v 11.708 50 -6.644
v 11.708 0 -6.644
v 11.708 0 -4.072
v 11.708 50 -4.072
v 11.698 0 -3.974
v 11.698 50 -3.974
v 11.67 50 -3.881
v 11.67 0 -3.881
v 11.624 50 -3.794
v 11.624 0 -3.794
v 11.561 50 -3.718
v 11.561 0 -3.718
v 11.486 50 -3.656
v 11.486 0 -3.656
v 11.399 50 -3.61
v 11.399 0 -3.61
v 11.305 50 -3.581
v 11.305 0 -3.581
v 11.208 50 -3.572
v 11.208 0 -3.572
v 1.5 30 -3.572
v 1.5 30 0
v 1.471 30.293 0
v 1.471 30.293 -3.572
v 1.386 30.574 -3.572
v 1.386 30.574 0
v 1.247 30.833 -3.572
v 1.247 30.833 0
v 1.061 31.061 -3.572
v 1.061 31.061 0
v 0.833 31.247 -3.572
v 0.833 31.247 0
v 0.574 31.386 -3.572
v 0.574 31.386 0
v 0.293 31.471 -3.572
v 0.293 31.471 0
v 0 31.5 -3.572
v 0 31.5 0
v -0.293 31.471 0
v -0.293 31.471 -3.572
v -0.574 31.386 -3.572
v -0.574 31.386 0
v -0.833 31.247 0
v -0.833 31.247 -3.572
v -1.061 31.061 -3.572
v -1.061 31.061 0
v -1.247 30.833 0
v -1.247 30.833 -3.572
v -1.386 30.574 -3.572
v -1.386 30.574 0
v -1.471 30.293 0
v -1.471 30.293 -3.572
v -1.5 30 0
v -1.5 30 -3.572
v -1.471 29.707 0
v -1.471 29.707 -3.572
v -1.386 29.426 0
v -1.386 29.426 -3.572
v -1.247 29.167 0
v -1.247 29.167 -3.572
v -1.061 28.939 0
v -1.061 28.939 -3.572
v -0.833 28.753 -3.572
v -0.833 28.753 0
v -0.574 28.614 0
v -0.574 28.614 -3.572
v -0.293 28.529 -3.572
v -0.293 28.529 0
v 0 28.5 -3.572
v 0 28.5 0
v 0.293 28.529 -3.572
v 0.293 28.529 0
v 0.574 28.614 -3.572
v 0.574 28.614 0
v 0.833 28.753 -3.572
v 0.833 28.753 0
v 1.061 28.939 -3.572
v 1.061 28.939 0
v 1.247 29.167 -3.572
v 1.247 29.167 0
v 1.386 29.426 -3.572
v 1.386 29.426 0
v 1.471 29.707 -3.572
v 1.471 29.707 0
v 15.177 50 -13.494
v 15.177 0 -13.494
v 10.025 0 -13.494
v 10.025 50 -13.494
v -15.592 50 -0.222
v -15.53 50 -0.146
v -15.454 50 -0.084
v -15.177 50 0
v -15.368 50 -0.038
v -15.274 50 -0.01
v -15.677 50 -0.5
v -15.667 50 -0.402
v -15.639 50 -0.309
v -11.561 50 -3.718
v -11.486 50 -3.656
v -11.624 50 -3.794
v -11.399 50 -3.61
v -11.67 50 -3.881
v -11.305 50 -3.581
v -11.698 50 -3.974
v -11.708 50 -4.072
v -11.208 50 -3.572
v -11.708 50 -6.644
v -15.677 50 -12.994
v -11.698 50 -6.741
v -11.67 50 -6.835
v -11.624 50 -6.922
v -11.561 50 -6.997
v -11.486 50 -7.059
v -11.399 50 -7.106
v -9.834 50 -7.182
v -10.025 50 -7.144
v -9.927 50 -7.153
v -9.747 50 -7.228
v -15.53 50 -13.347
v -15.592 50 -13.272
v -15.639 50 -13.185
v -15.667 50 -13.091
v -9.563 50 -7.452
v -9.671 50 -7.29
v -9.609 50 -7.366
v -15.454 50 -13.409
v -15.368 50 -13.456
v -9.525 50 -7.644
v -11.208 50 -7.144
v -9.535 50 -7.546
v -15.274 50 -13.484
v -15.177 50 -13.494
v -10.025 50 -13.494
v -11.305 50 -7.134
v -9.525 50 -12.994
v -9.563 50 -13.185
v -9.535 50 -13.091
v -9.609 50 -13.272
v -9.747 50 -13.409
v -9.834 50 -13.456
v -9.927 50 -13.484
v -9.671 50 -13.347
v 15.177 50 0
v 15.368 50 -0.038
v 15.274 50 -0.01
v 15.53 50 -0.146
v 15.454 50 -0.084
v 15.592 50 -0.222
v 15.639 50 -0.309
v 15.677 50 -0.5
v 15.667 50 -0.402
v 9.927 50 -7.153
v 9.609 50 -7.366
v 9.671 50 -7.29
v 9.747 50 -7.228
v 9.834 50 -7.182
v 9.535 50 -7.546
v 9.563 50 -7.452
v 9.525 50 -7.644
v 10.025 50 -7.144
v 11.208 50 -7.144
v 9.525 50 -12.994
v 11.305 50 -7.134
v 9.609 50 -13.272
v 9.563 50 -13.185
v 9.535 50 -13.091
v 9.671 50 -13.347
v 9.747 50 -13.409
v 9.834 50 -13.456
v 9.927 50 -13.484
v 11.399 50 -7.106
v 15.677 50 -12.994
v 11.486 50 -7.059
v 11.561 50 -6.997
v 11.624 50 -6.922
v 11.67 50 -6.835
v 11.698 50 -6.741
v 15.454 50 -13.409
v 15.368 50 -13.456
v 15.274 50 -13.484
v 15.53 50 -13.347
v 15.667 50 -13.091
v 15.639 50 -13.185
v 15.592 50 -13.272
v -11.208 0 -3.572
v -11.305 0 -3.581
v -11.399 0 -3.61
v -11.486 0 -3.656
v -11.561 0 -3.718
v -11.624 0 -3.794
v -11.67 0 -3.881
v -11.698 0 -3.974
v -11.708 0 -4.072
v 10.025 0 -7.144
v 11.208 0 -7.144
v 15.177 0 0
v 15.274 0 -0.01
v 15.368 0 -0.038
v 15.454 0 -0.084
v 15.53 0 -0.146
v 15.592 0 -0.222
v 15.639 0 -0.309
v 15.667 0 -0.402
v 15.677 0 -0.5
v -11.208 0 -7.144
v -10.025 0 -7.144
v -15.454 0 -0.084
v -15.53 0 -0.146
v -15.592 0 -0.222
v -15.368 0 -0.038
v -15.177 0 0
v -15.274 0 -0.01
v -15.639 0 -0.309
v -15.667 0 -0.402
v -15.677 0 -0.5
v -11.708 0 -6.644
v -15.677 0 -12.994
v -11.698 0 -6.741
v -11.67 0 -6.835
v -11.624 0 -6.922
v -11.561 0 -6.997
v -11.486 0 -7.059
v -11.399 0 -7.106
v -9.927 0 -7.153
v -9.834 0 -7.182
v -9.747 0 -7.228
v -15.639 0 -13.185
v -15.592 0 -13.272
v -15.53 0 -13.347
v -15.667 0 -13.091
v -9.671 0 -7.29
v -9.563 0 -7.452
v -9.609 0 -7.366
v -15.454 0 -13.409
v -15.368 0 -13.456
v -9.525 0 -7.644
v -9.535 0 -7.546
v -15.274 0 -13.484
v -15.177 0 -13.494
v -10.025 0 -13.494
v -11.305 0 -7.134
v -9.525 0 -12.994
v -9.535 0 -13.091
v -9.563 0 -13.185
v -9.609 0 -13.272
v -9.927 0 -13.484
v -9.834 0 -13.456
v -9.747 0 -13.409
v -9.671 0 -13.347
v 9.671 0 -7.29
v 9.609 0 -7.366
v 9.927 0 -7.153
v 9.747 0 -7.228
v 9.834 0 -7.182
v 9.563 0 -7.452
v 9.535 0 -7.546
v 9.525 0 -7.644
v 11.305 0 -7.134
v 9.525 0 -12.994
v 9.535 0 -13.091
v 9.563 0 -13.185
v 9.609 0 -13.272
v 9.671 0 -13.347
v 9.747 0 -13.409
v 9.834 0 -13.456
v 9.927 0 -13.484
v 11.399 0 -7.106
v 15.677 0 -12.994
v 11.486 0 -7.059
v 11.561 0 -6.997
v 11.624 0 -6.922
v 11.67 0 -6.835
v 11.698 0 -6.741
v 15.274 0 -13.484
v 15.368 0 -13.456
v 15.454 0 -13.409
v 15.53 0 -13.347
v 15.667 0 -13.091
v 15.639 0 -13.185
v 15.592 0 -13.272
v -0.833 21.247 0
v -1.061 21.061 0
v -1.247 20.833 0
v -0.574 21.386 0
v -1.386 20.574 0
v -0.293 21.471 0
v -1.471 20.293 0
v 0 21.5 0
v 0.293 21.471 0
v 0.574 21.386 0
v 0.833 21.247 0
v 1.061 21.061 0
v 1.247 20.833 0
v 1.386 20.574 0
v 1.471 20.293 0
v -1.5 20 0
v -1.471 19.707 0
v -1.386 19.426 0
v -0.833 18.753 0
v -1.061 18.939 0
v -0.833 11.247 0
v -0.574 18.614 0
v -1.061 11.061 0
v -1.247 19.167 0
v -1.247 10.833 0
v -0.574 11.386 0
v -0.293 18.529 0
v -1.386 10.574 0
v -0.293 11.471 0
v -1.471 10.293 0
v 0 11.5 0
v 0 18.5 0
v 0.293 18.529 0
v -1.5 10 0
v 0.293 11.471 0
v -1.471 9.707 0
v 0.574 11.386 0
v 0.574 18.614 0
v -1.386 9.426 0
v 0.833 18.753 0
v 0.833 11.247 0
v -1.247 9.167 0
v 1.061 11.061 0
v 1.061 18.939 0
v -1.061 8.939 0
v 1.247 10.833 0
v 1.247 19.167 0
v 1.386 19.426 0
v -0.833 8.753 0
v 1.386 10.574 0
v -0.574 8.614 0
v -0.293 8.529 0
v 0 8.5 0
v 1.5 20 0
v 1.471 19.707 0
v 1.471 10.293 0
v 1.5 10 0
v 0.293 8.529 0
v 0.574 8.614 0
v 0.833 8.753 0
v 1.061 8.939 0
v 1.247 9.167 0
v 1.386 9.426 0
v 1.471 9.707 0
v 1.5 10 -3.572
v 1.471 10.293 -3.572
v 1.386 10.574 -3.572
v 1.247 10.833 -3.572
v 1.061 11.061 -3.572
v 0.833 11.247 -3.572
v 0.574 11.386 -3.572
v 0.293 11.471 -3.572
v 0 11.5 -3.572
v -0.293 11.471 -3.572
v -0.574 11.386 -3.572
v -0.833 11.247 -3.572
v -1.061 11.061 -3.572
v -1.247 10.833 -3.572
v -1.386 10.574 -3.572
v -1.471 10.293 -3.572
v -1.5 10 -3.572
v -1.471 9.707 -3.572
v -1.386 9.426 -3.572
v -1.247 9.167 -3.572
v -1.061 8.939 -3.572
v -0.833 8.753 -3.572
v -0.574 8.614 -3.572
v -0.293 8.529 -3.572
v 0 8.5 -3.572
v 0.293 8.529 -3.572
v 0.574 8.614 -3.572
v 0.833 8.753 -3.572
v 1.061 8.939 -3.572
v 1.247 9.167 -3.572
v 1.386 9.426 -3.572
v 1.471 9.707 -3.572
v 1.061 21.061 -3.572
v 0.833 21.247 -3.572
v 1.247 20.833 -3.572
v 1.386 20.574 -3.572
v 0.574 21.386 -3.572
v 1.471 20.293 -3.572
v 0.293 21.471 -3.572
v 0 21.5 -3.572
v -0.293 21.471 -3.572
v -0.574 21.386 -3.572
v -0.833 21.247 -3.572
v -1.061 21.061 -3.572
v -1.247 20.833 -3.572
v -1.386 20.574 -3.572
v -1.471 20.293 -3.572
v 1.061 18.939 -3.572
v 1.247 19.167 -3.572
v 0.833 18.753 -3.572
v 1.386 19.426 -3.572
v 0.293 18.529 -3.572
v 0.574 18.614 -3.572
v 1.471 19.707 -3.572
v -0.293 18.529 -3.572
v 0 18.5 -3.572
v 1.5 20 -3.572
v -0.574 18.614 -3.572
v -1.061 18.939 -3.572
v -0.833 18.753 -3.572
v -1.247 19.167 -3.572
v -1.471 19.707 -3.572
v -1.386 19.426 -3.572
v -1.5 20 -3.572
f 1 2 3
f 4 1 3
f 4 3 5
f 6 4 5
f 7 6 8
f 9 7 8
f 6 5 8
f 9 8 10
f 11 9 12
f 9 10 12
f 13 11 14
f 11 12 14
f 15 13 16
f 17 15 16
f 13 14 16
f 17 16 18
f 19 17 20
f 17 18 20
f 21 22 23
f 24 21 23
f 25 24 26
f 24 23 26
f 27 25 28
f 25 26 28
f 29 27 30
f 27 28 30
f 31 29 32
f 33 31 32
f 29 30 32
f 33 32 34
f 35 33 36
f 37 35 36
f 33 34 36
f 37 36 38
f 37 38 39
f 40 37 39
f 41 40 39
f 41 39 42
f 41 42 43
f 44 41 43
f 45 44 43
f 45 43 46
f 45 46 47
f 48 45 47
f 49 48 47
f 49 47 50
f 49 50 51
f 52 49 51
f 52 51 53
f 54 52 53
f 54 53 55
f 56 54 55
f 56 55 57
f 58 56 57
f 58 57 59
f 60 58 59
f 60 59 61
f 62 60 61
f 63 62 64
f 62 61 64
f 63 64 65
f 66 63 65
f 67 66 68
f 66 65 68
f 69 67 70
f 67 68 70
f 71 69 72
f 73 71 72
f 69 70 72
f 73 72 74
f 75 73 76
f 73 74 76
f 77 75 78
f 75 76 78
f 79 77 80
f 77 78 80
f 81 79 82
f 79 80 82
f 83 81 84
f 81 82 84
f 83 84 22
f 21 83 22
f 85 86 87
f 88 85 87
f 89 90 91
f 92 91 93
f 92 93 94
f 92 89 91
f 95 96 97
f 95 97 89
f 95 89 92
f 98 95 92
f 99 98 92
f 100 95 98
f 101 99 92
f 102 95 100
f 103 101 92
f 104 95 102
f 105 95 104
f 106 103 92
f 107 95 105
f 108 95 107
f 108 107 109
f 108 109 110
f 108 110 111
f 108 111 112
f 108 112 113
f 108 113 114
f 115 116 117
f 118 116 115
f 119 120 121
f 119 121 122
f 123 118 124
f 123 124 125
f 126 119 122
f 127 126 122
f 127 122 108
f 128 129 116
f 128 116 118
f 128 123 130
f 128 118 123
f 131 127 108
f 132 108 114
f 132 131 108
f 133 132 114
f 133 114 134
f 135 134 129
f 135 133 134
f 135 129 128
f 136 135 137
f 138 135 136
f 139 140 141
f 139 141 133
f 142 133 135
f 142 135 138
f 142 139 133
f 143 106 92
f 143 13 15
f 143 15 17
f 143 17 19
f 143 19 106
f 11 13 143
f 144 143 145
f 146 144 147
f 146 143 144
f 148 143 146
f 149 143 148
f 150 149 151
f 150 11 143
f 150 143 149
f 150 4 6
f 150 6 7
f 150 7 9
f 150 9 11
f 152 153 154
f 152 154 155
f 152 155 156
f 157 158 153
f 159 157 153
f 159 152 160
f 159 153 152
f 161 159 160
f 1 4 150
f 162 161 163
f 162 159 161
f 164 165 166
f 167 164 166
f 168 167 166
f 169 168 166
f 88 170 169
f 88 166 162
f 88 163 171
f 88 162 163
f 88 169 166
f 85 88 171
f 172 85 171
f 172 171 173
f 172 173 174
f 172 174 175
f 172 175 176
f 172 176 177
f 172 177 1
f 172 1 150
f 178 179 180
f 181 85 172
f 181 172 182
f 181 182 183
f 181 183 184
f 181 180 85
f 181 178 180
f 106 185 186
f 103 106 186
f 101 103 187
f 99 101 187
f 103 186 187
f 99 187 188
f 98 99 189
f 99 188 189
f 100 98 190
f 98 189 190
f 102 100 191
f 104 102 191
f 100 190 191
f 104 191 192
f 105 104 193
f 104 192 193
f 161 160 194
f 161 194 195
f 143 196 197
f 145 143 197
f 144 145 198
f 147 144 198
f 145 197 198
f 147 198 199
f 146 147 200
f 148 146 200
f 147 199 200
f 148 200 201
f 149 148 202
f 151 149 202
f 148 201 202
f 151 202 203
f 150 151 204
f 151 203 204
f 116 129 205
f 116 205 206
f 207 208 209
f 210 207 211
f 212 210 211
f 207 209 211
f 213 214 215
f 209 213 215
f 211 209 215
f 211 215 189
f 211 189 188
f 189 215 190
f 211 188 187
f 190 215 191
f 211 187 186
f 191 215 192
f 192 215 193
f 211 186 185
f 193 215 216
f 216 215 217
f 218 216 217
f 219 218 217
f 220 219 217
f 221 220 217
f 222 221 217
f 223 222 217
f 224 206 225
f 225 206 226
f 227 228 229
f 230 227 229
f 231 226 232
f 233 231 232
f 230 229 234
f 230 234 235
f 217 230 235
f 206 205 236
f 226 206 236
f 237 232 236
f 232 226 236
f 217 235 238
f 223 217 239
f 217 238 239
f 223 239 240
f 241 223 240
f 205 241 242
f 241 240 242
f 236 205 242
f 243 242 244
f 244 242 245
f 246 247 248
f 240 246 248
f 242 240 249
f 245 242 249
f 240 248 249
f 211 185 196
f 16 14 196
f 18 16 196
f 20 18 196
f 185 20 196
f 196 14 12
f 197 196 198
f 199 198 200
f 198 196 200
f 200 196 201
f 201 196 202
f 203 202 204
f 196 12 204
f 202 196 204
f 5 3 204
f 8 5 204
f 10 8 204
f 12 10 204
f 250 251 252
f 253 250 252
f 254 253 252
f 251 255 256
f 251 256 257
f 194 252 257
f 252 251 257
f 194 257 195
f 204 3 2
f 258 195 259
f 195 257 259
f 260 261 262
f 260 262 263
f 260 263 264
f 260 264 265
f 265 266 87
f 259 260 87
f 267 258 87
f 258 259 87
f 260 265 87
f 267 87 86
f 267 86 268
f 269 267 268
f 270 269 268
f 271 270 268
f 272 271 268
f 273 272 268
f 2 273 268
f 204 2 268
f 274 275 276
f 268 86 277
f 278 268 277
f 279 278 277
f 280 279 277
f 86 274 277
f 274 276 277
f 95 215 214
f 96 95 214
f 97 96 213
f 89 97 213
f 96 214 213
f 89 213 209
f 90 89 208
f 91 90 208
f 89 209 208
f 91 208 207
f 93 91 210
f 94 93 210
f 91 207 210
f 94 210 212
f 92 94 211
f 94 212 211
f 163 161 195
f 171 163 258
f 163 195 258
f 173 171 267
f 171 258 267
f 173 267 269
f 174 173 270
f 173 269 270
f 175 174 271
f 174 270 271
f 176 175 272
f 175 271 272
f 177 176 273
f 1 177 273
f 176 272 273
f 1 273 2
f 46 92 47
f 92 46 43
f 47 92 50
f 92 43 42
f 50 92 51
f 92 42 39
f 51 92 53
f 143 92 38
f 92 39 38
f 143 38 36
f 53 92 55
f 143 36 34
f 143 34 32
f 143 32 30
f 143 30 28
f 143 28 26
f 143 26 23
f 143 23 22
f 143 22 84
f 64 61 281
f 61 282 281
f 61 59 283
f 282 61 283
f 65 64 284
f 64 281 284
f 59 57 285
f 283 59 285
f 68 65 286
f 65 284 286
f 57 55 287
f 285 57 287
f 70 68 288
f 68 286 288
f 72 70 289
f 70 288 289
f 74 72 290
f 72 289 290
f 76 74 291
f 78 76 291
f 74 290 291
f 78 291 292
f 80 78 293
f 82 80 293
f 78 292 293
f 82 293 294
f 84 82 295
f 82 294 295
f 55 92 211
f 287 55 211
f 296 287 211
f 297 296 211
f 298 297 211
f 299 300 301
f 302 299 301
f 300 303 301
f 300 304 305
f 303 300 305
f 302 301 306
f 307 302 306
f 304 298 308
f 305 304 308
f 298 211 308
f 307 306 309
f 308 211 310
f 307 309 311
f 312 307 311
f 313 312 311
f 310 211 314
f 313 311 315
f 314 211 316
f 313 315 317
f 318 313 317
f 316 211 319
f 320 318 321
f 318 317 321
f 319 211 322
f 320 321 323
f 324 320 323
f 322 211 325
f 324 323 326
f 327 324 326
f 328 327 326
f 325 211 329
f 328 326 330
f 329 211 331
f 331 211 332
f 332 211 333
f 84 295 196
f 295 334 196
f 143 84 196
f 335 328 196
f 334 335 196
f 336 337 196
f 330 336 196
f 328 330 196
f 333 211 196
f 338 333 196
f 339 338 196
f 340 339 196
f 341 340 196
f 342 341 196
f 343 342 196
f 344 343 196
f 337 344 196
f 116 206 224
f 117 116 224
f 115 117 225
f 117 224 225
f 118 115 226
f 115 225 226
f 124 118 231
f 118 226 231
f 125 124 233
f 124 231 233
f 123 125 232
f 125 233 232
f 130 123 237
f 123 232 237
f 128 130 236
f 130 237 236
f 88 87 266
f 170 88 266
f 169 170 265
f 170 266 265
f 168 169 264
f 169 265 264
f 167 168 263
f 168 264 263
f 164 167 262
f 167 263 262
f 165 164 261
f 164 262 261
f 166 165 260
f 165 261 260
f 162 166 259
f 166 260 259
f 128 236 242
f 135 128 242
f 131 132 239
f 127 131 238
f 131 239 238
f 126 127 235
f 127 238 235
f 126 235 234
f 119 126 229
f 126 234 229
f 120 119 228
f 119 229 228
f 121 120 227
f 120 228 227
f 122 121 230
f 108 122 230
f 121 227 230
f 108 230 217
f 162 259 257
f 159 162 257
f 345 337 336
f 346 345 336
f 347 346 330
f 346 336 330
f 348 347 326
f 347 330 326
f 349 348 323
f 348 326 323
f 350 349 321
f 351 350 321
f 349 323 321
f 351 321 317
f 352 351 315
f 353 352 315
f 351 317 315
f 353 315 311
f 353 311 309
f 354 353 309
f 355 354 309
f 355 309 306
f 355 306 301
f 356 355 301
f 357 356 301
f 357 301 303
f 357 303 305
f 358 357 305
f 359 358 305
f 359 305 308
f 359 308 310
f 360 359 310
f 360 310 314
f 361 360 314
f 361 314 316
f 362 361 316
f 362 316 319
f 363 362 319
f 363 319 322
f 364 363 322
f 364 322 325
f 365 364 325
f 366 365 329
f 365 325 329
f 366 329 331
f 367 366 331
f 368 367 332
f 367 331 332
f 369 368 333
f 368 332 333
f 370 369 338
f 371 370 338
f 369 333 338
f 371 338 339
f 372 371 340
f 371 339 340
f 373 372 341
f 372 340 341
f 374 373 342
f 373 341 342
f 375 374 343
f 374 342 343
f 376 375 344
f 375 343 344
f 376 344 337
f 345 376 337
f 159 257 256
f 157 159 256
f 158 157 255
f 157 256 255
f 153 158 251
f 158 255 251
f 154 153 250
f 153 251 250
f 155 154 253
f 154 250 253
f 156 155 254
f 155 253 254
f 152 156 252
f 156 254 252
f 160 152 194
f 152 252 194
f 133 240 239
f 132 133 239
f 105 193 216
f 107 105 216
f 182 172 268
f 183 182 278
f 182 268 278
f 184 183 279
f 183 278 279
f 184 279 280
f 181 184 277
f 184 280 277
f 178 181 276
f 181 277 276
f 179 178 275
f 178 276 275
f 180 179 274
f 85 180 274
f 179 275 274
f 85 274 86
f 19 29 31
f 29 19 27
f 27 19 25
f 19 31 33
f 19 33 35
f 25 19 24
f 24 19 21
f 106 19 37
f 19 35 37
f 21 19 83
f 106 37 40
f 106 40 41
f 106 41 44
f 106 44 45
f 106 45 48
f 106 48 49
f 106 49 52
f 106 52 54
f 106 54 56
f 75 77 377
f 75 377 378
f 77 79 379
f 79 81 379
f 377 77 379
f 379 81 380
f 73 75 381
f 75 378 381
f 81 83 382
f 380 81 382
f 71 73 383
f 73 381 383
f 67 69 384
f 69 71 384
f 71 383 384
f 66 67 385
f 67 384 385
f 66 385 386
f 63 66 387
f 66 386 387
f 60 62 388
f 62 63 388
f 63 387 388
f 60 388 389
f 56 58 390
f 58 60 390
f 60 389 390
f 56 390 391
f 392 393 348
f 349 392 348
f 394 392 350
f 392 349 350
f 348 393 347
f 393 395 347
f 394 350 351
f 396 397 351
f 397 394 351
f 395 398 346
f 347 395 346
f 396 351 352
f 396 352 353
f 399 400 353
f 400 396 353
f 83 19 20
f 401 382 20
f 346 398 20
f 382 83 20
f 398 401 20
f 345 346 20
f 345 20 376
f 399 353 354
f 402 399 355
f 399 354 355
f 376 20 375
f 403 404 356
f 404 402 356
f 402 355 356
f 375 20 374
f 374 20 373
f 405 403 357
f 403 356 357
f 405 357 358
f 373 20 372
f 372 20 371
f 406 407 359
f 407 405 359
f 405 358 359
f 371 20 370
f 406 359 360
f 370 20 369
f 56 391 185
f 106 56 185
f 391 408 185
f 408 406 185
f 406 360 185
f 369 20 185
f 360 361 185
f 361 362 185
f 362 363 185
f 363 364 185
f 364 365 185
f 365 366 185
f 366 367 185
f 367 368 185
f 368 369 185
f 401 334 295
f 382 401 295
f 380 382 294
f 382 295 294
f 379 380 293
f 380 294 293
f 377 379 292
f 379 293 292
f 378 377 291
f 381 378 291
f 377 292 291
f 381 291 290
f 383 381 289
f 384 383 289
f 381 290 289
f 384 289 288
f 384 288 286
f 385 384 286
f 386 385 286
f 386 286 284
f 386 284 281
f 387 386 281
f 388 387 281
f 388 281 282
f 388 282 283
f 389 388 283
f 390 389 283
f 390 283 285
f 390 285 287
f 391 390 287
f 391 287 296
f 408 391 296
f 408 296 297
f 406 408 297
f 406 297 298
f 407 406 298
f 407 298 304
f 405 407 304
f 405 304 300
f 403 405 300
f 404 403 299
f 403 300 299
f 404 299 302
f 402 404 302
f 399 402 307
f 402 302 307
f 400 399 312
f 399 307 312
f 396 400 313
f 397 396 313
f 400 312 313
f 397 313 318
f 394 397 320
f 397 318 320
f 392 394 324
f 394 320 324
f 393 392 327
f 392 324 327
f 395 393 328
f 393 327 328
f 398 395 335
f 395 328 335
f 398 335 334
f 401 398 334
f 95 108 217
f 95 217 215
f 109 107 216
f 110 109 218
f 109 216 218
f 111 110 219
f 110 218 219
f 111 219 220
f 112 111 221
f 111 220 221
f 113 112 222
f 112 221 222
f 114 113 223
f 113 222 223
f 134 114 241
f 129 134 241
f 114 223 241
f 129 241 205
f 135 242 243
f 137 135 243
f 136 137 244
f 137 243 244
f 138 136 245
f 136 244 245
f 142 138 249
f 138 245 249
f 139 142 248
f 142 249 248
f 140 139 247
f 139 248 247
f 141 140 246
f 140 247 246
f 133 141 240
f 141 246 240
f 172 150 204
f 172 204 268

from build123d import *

# Parameters (mm, degrees)
BOSS_EXTRUDE1_DEPTH = 50
CUT_EXTRUDE1_REACH  = 56.109
SKETCH2_R           = 1.5


with BuildPart() as part:
    # Sketch1 → Boss-Extrude1 (new body)
    with BuildSketch(Plane(origin=(0, 0, 0), x_dir=(1, 0, 0), z_dir=(0, 1, 0))):
        with BuildLine():
            Line((-15.1765625, 0), (15.1765625, 0))
            ThreePointArc((15.1765625, 0), (15.530115891, 0.146446609), (15.6765625, 0.5))
            Line((15.6765625, 0.5), (15.6765625, 12.99375))
            ThreePointArc((15.6765625, 12.99375), (15.530115891, 13.347303391), (15.1765625, 13.49375))
            Line((15.1765625, 13.49375), (10.025, 13.49375))
            ThreePointArc((10.025, 13.49375), (9.671446609, 13.347303391), (9.525, 12.99375))
            Line((9.525, 12.99375), (9.525, 7.64375))
            ThreePointArc((9.525, 7.64375), (9.671446609, 7.290196609), (10.025, 7.14375))
            Line((10.025, 7.14375), (11.2078125, 7.14375))
            ThreePointArc((11.2078125, 7.14375), (11.561365891, 6.997303391), (11.7078125, 6.64375))
            Line((11.7078125, 6.64375), (11.7078125, 4.071875))
            ThreePointArc((11.7078125, 4.071875), (11.561365891, 3.718321609), (11.2078125, 3.571875))
            Line((11.2078125, 3.571875), (-11.2078125, 3.571875))
            ThreePointArc((-11.2078125, 3.571875), (-11.561365891, 3.718321609), (-11.7078125, 4.071875))
            Line((-11.7078125, 4.071875), (-11.7078125, 6.64375))
            ThreePointArc((-11.7078125, 6.64375), (-11.561365891, 6.997303391), (-11.2078125, 7.14375))
            Line((-11.2078125, 7.14375), (-10.025, 7.14375))
            ThreePointArc((-10.025, 7.14375), (-9.671446609, 7.290196609), (-9.525, 7.64375))
            Line((-9.525, 7.64375), (-9.525, 12.99375))
            ThreePointArc((-9.525, 12.99375), (-9.671446609, 13.347303391), (-10.025, 13.49375))
            Line((-10.025, 13.49375), (-15.1765625, 13.49375))
            ThreePointArc((-15.1765625, 13.49375), (-15.530115891, 13.347303391), (-15.6765625, 12.99375))
            Line((-15.6765625, 12.99375), (-15.6765625, 0.5))
            ThreePointArc((-15.6765625, 0.5), (-15.530115891, 0.146446609), (-15.1765625, 0))
        make_face()
    extrude(amount=BOSS_EXTRUDE1_DEPTH)

    # Sketch2 → Cut-Extrude1 (cut, up to next)
    with BuildSketch(Plane.XY, mode=Mode.PRIVATE) as cut_extrude1_sk1:
        with Locations((0, 10)):
            Circle(SKETCH2_R)
    cut_extrude1_tool1 = extrude(cut_extrude1_sk1.sketch, amount=-CUT_EXTRUDE1_REACH, mode=Mode.PRIVATE) & part.part
    # Sketch2 → Cut-Extrude1 (cut, up to next)
    with BuildSketch(Plane.XY, mode=Mode.PRIVATE) as cut_extrude1_sk2:
        with Locations((0, 20)):
            Circle(SKETCH2_R)
    cut_extrude1_tool2 = extrude(cut_extrude1_sk2.sketch, amount=-CUT_EXTRUDE1_REACH, mode=Mode.PRIVATE) & part.part
    # Sketch2 → Cut-Extrude1 (cut, up to next)
    with BuildSketch(Plane.XY, mode=Mode.PRIVATE) as cut_extrude1_sk3:
        with Locations((0, 30)):
            Circle(SKETCH2_R)
    cut_extrude1_tool3 = extrude(cut_extrude1_sk3.sketch, amount=-CUT_EXTRUDE1_REACH, mode=Mode.PRIVATE) & part.part
    add(cut_extrude1_tool1.solids().sort_by_distance((0, 10, 0))[0], mode=Mode.SUBTRACT)
    add(cut_extrude1_tool2.solids().sort_by_distance((0, 20, 0))[0], mode=Mode.SUBTRACT)
    add(cut_extrude1_tool3.solids().sort_by_distance((0, 30, 0))[0], mode=Mode.SUBTRACT)


solid = part.part
